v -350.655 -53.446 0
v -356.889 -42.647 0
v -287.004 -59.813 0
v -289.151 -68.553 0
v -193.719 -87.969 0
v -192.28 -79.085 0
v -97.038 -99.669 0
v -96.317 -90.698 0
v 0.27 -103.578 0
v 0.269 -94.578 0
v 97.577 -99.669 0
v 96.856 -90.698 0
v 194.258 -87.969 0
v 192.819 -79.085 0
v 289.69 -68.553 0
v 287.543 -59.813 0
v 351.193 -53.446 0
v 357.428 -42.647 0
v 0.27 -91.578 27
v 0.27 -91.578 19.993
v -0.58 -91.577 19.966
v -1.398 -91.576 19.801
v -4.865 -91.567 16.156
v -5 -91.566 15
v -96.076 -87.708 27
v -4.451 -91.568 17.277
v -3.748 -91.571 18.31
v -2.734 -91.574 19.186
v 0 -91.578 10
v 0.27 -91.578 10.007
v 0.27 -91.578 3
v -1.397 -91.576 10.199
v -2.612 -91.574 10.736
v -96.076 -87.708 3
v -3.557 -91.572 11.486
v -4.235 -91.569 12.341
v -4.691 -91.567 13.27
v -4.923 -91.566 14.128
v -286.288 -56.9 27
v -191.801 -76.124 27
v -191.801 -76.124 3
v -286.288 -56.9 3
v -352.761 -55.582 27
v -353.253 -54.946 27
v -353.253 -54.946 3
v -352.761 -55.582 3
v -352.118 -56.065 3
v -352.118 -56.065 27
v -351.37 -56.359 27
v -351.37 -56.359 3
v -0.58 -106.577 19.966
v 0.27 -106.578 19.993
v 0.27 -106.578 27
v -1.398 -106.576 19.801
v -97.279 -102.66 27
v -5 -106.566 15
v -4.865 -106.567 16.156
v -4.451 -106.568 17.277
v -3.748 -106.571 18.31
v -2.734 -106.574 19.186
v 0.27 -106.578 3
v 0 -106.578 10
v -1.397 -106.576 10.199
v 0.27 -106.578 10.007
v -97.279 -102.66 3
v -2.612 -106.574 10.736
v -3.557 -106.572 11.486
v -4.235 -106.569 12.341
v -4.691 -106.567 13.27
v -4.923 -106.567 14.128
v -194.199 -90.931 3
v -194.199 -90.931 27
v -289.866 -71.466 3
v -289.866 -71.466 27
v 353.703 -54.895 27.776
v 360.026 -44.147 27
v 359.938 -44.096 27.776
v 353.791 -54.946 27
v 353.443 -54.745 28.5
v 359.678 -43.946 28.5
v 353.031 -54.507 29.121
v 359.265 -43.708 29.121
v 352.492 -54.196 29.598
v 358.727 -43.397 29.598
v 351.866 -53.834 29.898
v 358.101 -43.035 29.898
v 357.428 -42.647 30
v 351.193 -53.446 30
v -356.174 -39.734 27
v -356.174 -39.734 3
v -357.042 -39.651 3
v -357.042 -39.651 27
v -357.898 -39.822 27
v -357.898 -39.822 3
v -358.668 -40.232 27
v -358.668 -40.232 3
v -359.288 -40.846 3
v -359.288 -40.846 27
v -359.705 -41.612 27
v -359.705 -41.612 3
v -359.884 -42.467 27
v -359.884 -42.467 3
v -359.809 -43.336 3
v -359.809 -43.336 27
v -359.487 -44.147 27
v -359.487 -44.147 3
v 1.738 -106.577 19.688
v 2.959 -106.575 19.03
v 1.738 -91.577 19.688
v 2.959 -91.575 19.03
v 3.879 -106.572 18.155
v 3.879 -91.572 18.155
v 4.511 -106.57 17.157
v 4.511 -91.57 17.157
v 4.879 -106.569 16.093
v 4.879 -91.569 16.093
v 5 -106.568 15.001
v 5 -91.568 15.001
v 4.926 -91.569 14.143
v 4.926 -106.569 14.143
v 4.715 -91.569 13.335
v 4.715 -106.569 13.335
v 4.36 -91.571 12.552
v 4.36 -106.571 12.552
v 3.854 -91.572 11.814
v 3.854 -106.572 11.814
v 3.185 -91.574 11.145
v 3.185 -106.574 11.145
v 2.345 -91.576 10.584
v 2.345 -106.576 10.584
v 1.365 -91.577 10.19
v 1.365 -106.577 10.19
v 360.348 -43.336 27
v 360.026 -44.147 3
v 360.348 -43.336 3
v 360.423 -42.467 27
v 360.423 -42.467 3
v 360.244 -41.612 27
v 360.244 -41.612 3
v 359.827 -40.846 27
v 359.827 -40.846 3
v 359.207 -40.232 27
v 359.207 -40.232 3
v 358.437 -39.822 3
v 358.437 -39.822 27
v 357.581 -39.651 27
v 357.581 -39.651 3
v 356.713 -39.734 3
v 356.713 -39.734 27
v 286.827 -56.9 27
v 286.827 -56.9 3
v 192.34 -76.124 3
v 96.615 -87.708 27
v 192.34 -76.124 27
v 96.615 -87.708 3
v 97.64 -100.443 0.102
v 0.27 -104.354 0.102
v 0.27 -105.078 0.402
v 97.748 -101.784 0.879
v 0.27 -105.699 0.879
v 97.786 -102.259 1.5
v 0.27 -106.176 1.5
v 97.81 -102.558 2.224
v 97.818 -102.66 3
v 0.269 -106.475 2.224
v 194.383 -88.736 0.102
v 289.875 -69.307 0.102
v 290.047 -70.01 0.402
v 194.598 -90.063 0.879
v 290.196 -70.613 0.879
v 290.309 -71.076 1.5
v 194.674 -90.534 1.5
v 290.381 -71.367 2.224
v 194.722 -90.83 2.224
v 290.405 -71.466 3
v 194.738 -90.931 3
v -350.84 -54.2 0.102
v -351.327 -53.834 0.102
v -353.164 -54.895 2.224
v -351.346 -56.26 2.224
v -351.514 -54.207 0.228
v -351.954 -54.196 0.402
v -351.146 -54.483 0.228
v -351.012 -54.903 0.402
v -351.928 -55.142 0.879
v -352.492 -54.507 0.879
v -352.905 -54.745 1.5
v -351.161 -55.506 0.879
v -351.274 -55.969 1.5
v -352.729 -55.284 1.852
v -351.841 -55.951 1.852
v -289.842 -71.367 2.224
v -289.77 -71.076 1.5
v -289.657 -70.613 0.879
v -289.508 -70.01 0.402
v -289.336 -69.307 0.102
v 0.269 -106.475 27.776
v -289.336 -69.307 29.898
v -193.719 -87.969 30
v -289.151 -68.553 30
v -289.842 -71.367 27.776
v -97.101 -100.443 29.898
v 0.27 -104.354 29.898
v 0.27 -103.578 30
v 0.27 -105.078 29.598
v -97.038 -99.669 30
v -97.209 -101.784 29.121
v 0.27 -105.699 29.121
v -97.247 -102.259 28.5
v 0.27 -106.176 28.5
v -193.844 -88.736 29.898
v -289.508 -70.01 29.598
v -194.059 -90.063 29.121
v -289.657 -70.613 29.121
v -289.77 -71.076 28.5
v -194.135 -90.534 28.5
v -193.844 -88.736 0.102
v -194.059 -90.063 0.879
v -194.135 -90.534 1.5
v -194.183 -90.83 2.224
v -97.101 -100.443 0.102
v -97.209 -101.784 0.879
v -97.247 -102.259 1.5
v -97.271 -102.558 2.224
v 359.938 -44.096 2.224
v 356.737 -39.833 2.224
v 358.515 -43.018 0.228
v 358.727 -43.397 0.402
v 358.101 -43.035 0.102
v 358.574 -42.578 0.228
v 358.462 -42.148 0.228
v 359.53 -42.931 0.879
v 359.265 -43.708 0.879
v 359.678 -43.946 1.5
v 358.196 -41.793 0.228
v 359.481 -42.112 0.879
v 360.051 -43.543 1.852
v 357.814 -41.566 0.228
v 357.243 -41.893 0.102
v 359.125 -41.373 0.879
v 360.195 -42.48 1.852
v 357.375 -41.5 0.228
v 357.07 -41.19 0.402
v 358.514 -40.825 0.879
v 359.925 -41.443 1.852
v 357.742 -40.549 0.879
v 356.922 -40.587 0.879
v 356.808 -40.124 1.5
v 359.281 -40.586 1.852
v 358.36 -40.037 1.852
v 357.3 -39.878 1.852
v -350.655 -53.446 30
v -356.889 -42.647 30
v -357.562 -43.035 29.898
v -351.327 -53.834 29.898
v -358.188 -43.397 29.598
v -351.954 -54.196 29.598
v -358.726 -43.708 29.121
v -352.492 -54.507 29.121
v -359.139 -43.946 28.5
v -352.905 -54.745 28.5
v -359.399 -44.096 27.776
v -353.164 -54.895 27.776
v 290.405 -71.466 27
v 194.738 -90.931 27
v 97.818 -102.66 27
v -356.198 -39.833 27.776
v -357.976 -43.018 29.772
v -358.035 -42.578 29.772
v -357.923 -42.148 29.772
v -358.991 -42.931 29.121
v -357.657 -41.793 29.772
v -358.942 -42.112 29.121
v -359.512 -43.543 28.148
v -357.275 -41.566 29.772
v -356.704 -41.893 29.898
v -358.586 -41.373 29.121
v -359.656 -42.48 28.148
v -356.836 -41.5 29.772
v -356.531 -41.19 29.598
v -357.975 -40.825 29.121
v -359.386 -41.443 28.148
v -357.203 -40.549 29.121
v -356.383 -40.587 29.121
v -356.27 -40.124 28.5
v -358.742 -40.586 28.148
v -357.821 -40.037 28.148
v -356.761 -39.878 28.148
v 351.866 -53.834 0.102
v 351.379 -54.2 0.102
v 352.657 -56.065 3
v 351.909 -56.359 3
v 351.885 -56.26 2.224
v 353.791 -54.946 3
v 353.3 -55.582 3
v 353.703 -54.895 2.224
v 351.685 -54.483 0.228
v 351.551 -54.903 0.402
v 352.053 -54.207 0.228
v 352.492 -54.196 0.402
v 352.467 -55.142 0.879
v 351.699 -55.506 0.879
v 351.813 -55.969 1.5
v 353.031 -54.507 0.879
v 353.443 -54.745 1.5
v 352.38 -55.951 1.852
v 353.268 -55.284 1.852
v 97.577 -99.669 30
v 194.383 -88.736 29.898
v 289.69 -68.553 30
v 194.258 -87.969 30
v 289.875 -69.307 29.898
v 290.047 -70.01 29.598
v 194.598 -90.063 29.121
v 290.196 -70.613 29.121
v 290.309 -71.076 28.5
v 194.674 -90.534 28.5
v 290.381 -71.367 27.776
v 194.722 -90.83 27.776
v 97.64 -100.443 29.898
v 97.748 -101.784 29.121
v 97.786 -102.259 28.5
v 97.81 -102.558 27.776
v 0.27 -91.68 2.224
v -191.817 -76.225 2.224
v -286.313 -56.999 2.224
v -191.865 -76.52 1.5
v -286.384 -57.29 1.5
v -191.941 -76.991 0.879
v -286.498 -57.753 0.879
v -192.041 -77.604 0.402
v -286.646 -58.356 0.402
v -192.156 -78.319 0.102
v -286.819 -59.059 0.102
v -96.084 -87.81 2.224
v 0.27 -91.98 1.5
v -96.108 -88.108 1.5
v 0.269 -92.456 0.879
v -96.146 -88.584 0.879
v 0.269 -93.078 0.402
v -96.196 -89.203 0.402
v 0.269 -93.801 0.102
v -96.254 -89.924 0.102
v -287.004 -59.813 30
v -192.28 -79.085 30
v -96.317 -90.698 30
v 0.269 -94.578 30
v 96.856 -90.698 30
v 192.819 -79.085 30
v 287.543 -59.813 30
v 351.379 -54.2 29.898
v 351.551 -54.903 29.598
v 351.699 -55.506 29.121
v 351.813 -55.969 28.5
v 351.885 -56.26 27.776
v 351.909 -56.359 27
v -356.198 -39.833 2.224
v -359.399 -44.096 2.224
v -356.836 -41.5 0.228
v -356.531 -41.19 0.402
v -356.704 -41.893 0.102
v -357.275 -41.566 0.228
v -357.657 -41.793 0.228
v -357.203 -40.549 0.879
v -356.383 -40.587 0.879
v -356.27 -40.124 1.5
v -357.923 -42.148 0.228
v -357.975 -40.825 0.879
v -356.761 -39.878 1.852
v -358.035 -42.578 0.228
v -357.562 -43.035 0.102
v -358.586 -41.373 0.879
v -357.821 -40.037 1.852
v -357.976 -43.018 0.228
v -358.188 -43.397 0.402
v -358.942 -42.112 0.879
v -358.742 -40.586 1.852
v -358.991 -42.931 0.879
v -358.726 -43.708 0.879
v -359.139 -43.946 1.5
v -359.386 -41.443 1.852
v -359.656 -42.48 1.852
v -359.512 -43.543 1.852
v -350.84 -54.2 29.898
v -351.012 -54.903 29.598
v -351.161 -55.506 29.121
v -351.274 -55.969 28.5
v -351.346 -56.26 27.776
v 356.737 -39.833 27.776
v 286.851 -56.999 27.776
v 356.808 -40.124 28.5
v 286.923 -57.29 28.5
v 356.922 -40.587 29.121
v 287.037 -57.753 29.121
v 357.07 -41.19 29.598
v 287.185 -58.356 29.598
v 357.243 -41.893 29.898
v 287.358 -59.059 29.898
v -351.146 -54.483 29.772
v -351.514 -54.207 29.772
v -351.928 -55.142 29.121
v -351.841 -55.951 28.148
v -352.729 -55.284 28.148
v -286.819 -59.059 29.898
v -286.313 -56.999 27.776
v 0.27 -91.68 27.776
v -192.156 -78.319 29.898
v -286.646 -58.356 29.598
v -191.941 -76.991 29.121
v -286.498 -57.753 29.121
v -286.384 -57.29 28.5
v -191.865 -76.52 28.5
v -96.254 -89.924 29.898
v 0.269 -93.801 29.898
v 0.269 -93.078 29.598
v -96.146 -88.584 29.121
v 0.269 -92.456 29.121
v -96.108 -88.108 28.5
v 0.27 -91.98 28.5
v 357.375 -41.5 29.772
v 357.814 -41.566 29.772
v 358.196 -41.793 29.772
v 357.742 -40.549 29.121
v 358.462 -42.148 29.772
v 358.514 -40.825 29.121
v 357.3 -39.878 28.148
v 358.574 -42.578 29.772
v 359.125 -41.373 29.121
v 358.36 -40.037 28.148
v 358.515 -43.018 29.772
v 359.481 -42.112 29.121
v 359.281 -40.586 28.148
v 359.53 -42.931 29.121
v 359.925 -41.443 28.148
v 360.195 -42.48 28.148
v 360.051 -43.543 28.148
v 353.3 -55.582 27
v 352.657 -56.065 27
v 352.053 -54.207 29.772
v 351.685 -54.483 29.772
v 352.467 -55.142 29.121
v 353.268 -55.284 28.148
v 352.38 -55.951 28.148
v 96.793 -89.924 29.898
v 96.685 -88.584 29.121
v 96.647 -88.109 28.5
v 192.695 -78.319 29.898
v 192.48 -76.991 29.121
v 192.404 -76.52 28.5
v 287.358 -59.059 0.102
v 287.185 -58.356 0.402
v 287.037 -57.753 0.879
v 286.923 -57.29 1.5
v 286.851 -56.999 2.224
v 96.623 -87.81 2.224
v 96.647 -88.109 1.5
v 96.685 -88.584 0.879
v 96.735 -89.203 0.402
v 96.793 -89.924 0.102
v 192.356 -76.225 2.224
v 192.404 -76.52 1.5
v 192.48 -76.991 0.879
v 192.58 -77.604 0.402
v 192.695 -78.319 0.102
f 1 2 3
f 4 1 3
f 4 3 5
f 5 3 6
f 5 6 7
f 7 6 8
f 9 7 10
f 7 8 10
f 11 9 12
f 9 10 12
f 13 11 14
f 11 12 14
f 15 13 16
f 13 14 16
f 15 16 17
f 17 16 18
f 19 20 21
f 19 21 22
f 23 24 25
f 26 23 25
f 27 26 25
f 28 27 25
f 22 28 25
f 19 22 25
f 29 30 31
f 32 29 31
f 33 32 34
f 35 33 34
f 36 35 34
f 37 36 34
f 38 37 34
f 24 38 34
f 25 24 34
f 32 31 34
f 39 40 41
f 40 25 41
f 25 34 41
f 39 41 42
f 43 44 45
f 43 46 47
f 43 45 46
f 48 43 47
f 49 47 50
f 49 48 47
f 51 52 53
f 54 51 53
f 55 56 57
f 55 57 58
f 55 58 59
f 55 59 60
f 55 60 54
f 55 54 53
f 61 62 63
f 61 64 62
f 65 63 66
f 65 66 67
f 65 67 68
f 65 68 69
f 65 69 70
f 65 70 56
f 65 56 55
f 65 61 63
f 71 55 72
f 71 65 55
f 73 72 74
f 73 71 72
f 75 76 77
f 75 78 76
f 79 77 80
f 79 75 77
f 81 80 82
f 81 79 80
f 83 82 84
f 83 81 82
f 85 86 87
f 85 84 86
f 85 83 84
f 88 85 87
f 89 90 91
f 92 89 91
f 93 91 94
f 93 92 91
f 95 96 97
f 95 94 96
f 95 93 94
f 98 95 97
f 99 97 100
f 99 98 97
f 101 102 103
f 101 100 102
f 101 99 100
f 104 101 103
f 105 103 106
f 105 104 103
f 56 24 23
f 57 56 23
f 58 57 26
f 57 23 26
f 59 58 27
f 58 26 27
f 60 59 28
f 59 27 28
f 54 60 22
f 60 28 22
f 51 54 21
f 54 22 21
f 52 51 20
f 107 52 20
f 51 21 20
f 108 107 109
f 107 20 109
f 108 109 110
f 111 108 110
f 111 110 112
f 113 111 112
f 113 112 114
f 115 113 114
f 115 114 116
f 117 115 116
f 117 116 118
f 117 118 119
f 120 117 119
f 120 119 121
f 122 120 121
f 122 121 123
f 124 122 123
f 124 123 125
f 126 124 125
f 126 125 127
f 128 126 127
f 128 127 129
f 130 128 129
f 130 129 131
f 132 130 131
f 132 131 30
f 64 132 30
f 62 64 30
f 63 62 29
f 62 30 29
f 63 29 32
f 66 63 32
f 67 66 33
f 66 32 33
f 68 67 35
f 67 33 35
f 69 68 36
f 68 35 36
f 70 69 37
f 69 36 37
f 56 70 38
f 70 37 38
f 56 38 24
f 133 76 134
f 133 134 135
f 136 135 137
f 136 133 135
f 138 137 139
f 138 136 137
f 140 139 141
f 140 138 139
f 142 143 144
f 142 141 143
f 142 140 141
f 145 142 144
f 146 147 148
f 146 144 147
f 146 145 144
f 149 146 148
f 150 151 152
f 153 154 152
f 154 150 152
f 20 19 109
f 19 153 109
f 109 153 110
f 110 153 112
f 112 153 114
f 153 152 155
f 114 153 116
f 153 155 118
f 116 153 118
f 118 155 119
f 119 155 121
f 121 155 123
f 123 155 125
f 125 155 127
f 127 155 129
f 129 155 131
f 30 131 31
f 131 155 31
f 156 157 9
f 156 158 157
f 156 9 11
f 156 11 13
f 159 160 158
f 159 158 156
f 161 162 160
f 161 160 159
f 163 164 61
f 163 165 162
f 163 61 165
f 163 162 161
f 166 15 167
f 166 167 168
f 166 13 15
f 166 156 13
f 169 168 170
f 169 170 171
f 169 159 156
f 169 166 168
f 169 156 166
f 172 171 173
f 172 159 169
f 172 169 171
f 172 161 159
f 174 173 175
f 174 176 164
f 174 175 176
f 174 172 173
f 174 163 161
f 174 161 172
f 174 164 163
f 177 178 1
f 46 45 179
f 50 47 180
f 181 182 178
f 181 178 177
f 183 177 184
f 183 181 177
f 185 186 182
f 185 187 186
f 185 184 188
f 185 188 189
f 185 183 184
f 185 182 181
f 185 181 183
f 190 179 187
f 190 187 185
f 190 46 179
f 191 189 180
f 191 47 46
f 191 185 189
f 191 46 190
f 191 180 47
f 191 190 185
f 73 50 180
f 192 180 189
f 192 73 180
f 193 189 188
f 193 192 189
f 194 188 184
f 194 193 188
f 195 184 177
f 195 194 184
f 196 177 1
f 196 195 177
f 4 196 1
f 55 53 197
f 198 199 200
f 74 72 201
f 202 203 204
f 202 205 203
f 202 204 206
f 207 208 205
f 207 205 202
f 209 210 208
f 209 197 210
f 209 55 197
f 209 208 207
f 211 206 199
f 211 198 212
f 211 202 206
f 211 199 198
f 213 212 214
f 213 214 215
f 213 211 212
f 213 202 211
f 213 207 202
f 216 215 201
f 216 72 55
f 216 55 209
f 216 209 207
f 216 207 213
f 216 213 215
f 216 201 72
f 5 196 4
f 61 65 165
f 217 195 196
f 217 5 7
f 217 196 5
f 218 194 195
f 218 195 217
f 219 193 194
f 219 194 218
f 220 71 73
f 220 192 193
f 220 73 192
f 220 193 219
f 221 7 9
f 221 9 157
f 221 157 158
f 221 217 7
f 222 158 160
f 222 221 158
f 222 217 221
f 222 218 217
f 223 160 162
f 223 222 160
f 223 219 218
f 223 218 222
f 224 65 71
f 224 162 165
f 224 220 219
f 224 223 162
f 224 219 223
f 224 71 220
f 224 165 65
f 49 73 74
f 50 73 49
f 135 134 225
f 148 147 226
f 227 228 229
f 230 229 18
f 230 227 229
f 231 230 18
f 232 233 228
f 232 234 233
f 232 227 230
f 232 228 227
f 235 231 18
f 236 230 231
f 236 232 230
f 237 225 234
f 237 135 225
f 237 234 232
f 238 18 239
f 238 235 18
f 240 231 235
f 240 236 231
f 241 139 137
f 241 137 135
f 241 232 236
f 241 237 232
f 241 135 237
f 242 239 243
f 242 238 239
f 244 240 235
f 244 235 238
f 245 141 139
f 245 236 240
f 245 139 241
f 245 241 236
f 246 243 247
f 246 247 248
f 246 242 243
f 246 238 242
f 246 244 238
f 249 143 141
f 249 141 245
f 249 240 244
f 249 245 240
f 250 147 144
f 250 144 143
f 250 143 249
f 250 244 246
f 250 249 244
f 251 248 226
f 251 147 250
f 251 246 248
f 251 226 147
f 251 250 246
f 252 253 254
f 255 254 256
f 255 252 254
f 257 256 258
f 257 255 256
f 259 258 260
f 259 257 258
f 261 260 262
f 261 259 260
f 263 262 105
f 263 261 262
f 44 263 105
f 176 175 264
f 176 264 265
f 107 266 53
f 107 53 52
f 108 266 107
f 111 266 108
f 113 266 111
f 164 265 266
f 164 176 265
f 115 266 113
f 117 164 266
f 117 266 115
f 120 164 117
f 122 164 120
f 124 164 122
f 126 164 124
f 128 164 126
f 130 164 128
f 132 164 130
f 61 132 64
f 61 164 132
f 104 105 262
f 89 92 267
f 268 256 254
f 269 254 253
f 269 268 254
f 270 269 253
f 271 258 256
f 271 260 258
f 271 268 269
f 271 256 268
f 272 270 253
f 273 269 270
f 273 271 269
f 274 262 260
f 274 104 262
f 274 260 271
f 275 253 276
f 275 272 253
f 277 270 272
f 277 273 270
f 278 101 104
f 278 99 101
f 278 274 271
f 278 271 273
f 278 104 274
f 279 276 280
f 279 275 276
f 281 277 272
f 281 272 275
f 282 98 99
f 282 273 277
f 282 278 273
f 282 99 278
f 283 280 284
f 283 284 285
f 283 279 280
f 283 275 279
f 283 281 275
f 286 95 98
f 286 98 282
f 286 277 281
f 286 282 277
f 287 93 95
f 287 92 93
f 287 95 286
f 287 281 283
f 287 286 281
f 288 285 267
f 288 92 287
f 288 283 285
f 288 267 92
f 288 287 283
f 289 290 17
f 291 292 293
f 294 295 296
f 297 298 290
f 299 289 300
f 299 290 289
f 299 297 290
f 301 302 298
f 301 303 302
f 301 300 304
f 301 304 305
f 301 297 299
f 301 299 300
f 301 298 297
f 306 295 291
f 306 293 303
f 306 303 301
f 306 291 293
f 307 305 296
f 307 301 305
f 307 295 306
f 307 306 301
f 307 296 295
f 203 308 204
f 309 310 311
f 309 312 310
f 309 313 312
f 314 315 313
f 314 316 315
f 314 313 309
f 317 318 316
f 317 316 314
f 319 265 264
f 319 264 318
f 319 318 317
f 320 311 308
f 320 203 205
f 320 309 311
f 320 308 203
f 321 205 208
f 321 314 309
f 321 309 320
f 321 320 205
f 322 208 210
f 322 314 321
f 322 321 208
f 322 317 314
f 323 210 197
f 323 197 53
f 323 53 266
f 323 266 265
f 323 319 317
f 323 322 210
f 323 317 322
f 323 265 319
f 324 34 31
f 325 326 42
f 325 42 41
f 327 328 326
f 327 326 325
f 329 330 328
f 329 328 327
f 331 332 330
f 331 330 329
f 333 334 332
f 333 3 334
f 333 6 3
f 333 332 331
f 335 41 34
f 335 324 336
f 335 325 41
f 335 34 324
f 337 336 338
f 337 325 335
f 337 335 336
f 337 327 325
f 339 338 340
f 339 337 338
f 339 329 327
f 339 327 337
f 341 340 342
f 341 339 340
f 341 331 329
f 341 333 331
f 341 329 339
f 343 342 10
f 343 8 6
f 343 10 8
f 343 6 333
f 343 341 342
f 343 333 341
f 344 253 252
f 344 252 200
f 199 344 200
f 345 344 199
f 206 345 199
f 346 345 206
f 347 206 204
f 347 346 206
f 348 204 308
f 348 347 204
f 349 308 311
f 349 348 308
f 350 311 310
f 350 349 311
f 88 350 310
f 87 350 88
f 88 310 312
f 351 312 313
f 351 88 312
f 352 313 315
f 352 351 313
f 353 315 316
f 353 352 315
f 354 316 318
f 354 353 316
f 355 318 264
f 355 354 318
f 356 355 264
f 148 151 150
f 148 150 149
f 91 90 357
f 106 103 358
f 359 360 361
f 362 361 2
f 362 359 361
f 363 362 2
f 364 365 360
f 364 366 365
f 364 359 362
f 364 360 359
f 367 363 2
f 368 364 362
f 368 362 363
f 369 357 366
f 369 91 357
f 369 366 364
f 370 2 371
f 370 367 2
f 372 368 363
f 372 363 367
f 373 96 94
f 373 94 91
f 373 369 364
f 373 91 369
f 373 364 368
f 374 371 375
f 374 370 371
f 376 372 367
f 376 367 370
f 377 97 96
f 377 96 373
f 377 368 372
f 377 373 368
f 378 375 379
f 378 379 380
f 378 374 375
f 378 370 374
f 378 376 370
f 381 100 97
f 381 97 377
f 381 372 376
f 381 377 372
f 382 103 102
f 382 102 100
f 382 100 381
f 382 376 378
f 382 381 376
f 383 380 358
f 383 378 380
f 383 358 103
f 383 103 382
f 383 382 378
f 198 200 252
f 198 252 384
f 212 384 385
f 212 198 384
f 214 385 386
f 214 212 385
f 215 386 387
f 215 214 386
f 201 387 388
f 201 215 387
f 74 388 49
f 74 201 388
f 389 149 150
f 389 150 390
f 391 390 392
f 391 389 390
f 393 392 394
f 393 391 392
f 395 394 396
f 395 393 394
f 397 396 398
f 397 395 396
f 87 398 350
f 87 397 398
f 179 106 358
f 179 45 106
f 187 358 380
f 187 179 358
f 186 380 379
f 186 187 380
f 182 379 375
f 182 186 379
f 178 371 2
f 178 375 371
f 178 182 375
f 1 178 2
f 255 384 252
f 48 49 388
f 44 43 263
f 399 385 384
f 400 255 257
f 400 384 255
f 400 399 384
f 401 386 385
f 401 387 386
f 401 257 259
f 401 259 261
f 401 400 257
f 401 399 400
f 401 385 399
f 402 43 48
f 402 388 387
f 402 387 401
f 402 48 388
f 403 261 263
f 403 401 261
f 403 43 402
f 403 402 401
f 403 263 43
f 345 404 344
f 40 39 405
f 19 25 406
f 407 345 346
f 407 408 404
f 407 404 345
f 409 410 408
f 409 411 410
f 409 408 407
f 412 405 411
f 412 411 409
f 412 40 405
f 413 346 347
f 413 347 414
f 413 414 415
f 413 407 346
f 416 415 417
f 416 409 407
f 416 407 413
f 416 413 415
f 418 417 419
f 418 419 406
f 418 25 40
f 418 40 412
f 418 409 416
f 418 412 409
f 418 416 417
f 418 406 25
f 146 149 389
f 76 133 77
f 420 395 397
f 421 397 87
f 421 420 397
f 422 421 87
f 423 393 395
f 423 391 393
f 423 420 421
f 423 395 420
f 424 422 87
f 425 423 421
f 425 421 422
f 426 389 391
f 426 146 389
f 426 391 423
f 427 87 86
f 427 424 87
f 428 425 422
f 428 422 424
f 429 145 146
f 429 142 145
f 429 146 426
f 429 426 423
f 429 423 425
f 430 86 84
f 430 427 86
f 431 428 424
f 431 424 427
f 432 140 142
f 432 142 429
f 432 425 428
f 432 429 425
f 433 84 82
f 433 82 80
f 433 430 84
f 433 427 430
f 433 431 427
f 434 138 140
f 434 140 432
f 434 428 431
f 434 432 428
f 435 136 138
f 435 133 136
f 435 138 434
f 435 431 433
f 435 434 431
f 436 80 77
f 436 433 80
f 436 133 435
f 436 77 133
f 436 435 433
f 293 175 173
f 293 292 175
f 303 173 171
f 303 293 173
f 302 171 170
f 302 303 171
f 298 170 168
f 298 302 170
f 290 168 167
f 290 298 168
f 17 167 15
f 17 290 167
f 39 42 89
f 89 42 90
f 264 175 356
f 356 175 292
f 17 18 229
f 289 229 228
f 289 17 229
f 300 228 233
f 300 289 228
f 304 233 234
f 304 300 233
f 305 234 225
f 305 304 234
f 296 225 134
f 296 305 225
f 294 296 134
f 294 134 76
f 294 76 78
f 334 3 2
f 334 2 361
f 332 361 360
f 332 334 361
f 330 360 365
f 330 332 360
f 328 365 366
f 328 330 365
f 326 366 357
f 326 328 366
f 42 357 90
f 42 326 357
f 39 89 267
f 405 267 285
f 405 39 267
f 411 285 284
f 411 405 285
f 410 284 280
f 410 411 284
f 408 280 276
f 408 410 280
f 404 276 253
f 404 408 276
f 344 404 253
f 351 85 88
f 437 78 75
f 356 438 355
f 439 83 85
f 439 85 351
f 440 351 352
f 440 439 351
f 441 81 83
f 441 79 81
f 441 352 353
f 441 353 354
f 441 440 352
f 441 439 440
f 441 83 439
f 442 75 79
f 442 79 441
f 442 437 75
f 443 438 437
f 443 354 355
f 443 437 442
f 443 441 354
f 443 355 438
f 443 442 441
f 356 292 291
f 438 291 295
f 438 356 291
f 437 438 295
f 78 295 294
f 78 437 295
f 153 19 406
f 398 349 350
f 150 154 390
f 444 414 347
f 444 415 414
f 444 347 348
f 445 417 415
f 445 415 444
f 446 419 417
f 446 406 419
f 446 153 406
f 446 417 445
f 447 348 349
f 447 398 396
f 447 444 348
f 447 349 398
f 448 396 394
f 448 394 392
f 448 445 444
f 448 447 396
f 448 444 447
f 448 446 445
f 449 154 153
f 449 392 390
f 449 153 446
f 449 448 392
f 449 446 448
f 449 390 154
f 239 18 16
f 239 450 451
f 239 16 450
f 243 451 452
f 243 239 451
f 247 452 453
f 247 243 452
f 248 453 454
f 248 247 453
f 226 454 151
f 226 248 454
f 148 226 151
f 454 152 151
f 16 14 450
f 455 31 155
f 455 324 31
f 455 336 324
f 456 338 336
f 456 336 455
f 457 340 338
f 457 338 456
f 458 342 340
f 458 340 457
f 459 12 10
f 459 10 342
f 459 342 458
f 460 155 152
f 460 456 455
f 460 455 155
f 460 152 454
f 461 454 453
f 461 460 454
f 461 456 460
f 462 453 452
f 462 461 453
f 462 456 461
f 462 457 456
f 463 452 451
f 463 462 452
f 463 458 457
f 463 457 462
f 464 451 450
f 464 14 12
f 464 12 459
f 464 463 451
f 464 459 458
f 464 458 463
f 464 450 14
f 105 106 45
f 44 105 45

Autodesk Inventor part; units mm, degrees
ref_plane "YZ Plane" through (0, 0, 0) normal (1, 0, 0) x (0, 1, 0)
ref_plane "XZ Plane" through (0, 0, 0) normal (0, 1, 0) x (-1, 0, 0)
ref_plane "XY Plane" through (0, 0, 0) normal (0, 0, 1) x (1, 0, 0)
sketch "Sketch1" plane through (0, 0, 0) normal (0, 0, 1) x (1, 0, 0)
  arc A0 (0.2695, -91.5776) -> (286.8271, -56.8995) centre (0.2695, 1109.728) ccw
  arc A1 (0.2695, -106.5776) -> (290.4052, -71.4665) centre (0.2695, 1109.728) ccw
  line L0 (0.2695, -106.5776) -> (0.2695, -82.8765)
  line L1 (0, 0) -> (363.543, 0)
  line L2 (286.8271, -56.8995) -> (363.543, -38.0559)
  line L3 (290.4052, -71.4665) -> (353.1517, -56.0541)
  line L4 (363.543, -38.0559) -> (353.1517, -56.0541)
  arc A2 (-286.2882, -56.8995) -> (0.2695, -91.5776) centre (0.2695, 1109.728) ccw
  arc A3 (-289.8663, -71.4665) -> (0.2695, -106.5776) centre (0.2695, 1109.728) ccw
  line L5 (-286.2882, -56.8995) -> (-363.0041, -38.0559)
  line L6 (-289.8663, -71.4665) -> (-352.6128, -56.0541)
  line L7 (-363.0041, -38.0559) -> (-352.6128, -56.0541)
  point P0 (254.9341, -79.6185)
  dimension "d0" = 15
  dimension "d9" = 363.543
extrude "Extrusion1" add sketch "Sketch1" along normal blind 30
sketch "Sketch2" plane through (0, 0, 0) normal (0, 1, 0) x (-1, 0, 0)
  line L0 (0, 0) -> (0, 15)
  circle A0 centre (0, 15) radius 5
  dimension "d5" = 15
  dimension "d6" = 10
extrude "Extrusion2" cut sketch "Sketch2" against normal blind 300
fillet "Fillet2" radius 3 20 edges at (-363.0041, -38.0559, 15) (-357.8084, -47.055, 0) (-357.8084, -47.055, 30) (-352.6128, -56.0541, 15) (146.3957, -97.7679, 30) (321.7784, -63.7603, 30) (-321.2395, -63.7603, 30) (146.3957, -97.7679, 0) (321.7784, -63.7603, 0) (-321.2395, -63.7603, 0) (-144.0547, -82.8765, 30) (325.1851, -47.4777, 30) (-324.6461, -47.4777, 30) (358.3473, -47.055, 30) (363.543, -38.0559, 15) (144.5936, -82.8765, 0) (-324.6461, -47.4777, 0) (325.1851, -47.4777, 0) (358.3473, -47.055, 0) (353.1517, -56.0541, 15)
properties part number "leaf 33" material "Steel, Carbon"
